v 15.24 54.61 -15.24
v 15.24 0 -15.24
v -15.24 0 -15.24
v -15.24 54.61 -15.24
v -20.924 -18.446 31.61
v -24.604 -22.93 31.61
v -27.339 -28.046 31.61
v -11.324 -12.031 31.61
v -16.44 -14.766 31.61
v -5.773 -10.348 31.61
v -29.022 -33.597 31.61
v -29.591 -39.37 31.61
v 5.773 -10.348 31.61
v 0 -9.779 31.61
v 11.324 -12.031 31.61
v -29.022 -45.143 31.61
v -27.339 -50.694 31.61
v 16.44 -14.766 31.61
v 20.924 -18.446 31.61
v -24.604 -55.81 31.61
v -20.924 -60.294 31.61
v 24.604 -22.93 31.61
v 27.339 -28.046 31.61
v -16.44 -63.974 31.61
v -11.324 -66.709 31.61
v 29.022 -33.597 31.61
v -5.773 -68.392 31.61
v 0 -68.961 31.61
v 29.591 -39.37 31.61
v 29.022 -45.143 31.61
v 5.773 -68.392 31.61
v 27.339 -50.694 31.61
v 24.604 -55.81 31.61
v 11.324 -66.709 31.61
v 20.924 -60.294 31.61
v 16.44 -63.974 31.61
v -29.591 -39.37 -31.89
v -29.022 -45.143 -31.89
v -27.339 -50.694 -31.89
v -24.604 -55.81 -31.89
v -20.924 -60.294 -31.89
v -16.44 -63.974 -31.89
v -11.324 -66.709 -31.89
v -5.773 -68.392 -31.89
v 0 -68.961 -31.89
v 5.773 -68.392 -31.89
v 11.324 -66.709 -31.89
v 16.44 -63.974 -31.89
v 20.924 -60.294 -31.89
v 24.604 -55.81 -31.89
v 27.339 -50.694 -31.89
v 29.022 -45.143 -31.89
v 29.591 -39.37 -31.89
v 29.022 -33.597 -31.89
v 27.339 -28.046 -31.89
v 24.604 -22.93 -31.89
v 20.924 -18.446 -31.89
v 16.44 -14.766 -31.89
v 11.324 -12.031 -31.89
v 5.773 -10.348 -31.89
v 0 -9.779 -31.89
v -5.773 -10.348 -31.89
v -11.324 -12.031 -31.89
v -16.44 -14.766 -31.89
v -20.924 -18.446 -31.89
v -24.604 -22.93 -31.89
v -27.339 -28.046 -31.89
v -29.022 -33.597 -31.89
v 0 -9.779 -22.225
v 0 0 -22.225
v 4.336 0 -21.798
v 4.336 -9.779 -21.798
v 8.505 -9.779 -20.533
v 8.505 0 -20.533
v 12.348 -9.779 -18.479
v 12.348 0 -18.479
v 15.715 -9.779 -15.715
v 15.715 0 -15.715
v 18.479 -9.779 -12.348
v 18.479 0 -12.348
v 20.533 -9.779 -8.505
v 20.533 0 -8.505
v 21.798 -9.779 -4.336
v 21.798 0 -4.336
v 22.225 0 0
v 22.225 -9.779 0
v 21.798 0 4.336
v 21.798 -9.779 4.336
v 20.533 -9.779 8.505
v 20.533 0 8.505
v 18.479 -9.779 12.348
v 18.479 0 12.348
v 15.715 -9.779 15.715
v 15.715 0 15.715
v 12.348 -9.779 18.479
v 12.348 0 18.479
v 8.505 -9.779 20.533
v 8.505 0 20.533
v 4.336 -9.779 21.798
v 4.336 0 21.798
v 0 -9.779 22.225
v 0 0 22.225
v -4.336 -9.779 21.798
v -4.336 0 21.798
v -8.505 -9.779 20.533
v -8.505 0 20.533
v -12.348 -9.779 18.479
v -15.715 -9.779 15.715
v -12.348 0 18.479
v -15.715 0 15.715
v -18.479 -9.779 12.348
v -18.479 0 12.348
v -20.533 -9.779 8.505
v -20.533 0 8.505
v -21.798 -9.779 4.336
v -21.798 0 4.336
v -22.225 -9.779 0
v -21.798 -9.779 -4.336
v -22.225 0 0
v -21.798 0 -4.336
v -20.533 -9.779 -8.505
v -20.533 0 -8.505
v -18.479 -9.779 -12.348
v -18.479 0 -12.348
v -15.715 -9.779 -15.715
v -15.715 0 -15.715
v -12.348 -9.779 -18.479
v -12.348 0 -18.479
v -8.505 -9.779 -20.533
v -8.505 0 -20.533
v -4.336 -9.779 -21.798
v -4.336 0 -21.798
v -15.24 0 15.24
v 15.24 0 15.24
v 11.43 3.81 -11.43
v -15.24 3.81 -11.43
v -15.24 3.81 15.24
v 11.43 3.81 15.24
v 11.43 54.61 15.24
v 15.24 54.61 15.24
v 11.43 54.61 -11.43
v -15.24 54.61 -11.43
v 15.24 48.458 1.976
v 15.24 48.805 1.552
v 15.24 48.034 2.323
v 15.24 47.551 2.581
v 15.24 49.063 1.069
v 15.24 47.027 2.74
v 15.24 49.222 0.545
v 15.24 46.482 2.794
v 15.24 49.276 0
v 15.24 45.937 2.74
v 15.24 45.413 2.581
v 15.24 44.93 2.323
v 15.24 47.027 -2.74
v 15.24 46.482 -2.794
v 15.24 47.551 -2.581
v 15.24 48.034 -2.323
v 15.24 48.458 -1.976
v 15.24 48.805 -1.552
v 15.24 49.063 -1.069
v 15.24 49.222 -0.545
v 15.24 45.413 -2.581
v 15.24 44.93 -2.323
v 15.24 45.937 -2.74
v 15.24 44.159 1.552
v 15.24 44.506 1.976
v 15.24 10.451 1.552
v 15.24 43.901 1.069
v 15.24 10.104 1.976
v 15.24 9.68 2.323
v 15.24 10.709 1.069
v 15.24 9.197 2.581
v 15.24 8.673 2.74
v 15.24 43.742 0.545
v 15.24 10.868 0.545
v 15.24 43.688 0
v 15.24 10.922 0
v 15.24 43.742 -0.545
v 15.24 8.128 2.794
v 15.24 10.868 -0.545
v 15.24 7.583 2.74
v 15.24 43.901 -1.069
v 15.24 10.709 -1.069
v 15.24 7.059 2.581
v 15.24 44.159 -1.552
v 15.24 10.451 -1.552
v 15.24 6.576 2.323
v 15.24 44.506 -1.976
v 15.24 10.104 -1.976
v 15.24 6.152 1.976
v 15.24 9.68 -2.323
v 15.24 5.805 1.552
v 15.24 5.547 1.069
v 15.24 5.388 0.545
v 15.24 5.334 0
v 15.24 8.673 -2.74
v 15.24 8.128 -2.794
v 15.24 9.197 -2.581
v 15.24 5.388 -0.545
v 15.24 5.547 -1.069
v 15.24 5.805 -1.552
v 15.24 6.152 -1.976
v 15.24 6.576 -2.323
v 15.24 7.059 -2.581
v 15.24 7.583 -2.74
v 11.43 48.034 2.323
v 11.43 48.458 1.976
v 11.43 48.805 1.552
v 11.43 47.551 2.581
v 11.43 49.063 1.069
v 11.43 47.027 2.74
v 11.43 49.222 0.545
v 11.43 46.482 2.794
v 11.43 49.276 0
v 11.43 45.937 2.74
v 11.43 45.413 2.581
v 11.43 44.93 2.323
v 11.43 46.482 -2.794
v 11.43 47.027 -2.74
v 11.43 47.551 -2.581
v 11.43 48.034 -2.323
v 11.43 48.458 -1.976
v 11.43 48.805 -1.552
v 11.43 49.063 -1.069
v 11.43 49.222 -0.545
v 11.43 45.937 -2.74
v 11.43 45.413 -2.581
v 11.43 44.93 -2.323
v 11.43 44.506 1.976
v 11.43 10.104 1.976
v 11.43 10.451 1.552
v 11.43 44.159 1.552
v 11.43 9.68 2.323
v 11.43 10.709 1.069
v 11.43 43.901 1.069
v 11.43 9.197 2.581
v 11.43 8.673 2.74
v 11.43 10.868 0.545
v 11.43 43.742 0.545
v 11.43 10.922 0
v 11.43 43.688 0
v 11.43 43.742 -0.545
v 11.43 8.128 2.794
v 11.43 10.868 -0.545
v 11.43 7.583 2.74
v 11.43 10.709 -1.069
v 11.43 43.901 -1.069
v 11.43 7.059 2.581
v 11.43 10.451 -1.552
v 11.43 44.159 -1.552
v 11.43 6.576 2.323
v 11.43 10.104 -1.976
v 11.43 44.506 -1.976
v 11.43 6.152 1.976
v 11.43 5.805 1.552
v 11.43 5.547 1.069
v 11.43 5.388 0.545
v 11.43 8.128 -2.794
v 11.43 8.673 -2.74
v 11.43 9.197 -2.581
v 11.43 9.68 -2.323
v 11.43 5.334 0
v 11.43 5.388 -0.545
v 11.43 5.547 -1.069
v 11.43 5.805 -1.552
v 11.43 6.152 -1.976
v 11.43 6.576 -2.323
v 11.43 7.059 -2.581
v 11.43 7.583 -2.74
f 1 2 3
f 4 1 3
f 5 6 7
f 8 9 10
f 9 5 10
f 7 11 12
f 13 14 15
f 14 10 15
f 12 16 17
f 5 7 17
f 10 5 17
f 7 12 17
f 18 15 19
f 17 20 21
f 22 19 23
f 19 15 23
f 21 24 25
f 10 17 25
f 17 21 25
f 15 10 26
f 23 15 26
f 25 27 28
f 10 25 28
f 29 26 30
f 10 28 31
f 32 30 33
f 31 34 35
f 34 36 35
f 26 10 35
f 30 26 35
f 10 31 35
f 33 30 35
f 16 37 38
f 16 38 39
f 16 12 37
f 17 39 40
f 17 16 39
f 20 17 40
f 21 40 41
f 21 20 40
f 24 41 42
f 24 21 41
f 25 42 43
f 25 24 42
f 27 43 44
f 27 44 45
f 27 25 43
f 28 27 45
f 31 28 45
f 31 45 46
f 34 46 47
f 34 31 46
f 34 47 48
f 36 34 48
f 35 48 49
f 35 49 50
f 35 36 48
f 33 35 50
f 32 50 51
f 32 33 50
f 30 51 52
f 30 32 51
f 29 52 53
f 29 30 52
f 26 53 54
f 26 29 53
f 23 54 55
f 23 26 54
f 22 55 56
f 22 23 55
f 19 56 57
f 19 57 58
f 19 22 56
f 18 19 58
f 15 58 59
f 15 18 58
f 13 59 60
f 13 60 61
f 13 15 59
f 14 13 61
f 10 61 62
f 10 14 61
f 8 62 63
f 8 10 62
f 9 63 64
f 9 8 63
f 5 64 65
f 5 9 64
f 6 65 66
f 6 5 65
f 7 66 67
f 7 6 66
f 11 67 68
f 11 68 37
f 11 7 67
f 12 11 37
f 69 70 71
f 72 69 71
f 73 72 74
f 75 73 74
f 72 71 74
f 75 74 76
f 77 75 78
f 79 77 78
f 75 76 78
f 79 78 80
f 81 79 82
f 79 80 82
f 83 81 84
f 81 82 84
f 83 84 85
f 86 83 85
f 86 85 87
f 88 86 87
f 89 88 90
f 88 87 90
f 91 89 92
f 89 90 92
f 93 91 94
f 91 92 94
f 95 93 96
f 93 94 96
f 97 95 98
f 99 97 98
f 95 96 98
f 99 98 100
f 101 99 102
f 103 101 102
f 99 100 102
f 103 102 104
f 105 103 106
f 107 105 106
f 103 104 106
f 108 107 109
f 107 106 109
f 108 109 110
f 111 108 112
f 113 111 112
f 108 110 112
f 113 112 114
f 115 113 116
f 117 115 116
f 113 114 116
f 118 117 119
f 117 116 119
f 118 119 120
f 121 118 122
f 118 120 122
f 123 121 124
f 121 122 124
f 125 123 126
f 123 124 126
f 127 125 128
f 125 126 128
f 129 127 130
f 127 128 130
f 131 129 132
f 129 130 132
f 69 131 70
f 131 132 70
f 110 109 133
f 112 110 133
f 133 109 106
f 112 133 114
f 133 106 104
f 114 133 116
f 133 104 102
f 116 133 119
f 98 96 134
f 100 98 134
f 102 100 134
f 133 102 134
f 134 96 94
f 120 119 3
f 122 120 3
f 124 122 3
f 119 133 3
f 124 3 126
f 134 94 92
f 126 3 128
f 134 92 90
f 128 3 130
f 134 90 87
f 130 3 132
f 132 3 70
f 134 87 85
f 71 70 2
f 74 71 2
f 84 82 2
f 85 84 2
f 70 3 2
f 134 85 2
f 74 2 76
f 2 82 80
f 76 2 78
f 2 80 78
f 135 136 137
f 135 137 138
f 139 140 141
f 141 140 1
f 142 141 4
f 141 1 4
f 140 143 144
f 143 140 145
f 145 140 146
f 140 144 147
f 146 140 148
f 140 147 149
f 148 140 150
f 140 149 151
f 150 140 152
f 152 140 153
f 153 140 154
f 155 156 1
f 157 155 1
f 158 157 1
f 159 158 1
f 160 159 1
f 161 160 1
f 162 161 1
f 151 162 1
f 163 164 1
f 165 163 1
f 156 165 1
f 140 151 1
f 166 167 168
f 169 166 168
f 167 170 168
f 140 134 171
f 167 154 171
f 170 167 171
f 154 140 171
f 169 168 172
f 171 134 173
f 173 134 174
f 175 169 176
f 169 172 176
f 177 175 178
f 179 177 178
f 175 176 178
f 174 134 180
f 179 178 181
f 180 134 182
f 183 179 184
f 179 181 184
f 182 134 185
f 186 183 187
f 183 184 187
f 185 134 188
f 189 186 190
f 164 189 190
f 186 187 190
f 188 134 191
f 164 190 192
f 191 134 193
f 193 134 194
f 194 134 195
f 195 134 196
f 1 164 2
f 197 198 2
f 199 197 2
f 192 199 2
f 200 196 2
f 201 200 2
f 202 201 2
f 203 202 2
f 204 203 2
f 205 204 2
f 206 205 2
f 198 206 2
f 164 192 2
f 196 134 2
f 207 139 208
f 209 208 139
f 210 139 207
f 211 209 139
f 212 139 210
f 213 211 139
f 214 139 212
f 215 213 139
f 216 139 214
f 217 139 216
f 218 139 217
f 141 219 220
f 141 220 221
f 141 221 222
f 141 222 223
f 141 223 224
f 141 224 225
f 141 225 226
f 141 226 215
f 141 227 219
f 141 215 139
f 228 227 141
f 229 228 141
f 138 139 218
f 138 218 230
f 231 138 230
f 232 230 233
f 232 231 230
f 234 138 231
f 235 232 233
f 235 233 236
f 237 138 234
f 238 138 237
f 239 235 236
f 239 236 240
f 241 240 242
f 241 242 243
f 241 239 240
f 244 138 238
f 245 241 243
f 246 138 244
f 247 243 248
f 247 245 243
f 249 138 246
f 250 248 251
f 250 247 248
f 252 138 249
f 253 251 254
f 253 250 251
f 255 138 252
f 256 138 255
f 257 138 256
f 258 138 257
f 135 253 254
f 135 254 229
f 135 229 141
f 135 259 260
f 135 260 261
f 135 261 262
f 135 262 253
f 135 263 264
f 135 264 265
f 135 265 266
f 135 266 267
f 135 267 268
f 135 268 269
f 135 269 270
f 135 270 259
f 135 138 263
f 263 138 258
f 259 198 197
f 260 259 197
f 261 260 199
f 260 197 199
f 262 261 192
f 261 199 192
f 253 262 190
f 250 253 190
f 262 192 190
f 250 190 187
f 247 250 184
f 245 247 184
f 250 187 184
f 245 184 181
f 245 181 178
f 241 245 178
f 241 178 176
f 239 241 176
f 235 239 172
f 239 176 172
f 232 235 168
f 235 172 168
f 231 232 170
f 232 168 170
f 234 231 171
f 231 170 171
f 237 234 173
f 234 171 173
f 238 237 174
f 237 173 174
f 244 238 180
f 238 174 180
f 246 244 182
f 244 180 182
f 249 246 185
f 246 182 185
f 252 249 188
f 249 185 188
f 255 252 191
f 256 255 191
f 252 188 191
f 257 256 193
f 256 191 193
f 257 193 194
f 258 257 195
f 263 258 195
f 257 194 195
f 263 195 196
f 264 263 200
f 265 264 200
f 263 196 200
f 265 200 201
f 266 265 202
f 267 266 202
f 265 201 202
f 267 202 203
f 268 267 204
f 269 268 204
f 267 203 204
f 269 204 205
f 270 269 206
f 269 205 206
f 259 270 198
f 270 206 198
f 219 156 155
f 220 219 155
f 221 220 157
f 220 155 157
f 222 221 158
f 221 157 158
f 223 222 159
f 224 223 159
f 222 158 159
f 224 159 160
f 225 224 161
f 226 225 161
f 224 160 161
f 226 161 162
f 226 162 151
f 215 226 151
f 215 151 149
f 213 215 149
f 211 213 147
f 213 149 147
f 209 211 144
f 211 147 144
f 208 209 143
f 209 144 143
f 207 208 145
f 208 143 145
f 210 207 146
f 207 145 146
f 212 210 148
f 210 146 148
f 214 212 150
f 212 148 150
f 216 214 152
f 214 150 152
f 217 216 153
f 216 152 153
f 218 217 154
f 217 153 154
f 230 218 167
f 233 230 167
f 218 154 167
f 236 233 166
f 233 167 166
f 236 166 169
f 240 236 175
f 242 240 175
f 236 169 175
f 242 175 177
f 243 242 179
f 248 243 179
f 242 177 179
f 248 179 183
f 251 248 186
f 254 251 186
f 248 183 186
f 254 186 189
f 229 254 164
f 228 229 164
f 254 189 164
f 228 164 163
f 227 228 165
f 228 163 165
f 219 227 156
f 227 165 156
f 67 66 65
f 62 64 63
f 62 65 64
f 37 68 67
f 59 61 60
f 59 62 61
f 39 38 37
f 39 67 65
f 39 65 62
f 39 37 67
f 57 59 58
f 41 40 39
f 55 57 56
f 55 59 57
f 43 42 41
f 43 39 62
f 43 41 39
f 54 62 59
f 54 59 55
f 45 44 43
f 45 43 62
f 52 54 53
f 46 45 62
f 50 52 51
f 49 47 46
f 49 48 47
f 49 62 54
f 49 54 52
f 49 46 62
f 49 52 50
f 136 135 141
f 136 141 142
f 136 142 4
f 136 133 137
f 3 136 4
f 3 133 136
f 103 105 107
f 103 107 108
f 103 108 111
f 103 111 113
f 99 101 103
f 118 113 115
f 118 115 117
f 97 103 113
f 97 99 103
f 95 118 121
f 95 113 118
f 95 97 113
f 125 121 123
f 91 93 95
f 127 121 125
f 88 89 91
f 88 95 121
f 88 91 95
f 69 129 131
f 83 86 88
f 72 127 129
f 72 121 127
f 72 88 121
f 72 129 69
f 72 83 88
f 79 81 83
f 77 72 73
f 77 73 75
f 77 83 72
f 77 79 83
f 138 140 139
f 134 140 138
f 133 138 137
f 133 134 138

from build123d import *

# Parameters (mm, degrees)
SKETCH1_W           = 30.48
SKETCH1_H           = 30.48
BOSS_EXTRUDE1_DEPTH = 3.81
BOSS_EXTRUDE2_DEPTH = 50.8
SKETCH3_R           = 2.794
CUT_EXTRUDE1_DEPTH  = 3.81
SKETCH4_R           = 22.225
BOSS_EXTRUDE3_DEPTH = 9.779
SKETCH5_W           = 63.5
SKETCH5_H           = 29.591


with BuildPart() as part:
    # Sketch1 → Boss-Extrude1 (new body)
    with BuildSketch(Plane(origin=(0, 0, 0), x_dir=(1, 0, 0), z_dir=(0, 1, 0))):
        Rectangle(SKETCH1_W, SKETCH1_H)
    extrude(amount=BOSS_EXTRUDE1_DEPTH)

    # Sketch2 → Boss-Extrude2 (add)
    with BuildSketch(Plane(origin=(0, 3.81, 0), x_dir=(1, 0, 0), z_dir=(0, 1, 0))):
        Polygon((-15.24, 15.24), (11.43, 15.24), (15.24, 15.24), (15.24, 11.43), (15.24, -15.24), (11.43, -15.24), (11.43, 11.43), (-15.24, 11.43), align=None)
    extrude(amount=BOSS_EXTRUDE2_DEPTH)

    # Sketch3 → Cut-Extrude1 (cut)
    with BuildSketch(Plane(origin=(15.24, 0, 0), x_dir=(0, 0, -1), z_dir=(1, 0, 0))):
        with Locations((0, 46.482)):
            Circle(SKETCH3_R)
        with Locations((0, 8.128)):
            Circle(SKETCH3_R)
    extrude(amount=-CUT_EXTRUDE1_DEPTH, mode=Mode.SUBTRACT)

    # Sketch4 → Boss-Extrude3 (add)
    with BuildSketch(Plane.XZ):
        with Locations(Location((0, 0, 0), (0, 0, 270))):
            Circle(SKETCH4_R)
    extrude(amount=BOSS_EXTRUDE3_DEPTH)


with BuildPart() as body_2:
    # Sketch5 → Revolve1 (revolve)
    with BuildSketch(Plane.ZY, mode=Mode.PRIVATE) as revolve1_sk:
        with Locations((-0.140484246, -24.5745)):
            Rectangle(SKETCH5_W, SKETCH5_H)
    revolve(revolve1_sk.sketch.rotate(Axis((0, -39.37, -31.890484246), (0, 0, 1)), 90), axis=Axis((0, -39.37, -31.890484246), (0, 0, 1)))


solid = Compound([part.part, body_2.part])
